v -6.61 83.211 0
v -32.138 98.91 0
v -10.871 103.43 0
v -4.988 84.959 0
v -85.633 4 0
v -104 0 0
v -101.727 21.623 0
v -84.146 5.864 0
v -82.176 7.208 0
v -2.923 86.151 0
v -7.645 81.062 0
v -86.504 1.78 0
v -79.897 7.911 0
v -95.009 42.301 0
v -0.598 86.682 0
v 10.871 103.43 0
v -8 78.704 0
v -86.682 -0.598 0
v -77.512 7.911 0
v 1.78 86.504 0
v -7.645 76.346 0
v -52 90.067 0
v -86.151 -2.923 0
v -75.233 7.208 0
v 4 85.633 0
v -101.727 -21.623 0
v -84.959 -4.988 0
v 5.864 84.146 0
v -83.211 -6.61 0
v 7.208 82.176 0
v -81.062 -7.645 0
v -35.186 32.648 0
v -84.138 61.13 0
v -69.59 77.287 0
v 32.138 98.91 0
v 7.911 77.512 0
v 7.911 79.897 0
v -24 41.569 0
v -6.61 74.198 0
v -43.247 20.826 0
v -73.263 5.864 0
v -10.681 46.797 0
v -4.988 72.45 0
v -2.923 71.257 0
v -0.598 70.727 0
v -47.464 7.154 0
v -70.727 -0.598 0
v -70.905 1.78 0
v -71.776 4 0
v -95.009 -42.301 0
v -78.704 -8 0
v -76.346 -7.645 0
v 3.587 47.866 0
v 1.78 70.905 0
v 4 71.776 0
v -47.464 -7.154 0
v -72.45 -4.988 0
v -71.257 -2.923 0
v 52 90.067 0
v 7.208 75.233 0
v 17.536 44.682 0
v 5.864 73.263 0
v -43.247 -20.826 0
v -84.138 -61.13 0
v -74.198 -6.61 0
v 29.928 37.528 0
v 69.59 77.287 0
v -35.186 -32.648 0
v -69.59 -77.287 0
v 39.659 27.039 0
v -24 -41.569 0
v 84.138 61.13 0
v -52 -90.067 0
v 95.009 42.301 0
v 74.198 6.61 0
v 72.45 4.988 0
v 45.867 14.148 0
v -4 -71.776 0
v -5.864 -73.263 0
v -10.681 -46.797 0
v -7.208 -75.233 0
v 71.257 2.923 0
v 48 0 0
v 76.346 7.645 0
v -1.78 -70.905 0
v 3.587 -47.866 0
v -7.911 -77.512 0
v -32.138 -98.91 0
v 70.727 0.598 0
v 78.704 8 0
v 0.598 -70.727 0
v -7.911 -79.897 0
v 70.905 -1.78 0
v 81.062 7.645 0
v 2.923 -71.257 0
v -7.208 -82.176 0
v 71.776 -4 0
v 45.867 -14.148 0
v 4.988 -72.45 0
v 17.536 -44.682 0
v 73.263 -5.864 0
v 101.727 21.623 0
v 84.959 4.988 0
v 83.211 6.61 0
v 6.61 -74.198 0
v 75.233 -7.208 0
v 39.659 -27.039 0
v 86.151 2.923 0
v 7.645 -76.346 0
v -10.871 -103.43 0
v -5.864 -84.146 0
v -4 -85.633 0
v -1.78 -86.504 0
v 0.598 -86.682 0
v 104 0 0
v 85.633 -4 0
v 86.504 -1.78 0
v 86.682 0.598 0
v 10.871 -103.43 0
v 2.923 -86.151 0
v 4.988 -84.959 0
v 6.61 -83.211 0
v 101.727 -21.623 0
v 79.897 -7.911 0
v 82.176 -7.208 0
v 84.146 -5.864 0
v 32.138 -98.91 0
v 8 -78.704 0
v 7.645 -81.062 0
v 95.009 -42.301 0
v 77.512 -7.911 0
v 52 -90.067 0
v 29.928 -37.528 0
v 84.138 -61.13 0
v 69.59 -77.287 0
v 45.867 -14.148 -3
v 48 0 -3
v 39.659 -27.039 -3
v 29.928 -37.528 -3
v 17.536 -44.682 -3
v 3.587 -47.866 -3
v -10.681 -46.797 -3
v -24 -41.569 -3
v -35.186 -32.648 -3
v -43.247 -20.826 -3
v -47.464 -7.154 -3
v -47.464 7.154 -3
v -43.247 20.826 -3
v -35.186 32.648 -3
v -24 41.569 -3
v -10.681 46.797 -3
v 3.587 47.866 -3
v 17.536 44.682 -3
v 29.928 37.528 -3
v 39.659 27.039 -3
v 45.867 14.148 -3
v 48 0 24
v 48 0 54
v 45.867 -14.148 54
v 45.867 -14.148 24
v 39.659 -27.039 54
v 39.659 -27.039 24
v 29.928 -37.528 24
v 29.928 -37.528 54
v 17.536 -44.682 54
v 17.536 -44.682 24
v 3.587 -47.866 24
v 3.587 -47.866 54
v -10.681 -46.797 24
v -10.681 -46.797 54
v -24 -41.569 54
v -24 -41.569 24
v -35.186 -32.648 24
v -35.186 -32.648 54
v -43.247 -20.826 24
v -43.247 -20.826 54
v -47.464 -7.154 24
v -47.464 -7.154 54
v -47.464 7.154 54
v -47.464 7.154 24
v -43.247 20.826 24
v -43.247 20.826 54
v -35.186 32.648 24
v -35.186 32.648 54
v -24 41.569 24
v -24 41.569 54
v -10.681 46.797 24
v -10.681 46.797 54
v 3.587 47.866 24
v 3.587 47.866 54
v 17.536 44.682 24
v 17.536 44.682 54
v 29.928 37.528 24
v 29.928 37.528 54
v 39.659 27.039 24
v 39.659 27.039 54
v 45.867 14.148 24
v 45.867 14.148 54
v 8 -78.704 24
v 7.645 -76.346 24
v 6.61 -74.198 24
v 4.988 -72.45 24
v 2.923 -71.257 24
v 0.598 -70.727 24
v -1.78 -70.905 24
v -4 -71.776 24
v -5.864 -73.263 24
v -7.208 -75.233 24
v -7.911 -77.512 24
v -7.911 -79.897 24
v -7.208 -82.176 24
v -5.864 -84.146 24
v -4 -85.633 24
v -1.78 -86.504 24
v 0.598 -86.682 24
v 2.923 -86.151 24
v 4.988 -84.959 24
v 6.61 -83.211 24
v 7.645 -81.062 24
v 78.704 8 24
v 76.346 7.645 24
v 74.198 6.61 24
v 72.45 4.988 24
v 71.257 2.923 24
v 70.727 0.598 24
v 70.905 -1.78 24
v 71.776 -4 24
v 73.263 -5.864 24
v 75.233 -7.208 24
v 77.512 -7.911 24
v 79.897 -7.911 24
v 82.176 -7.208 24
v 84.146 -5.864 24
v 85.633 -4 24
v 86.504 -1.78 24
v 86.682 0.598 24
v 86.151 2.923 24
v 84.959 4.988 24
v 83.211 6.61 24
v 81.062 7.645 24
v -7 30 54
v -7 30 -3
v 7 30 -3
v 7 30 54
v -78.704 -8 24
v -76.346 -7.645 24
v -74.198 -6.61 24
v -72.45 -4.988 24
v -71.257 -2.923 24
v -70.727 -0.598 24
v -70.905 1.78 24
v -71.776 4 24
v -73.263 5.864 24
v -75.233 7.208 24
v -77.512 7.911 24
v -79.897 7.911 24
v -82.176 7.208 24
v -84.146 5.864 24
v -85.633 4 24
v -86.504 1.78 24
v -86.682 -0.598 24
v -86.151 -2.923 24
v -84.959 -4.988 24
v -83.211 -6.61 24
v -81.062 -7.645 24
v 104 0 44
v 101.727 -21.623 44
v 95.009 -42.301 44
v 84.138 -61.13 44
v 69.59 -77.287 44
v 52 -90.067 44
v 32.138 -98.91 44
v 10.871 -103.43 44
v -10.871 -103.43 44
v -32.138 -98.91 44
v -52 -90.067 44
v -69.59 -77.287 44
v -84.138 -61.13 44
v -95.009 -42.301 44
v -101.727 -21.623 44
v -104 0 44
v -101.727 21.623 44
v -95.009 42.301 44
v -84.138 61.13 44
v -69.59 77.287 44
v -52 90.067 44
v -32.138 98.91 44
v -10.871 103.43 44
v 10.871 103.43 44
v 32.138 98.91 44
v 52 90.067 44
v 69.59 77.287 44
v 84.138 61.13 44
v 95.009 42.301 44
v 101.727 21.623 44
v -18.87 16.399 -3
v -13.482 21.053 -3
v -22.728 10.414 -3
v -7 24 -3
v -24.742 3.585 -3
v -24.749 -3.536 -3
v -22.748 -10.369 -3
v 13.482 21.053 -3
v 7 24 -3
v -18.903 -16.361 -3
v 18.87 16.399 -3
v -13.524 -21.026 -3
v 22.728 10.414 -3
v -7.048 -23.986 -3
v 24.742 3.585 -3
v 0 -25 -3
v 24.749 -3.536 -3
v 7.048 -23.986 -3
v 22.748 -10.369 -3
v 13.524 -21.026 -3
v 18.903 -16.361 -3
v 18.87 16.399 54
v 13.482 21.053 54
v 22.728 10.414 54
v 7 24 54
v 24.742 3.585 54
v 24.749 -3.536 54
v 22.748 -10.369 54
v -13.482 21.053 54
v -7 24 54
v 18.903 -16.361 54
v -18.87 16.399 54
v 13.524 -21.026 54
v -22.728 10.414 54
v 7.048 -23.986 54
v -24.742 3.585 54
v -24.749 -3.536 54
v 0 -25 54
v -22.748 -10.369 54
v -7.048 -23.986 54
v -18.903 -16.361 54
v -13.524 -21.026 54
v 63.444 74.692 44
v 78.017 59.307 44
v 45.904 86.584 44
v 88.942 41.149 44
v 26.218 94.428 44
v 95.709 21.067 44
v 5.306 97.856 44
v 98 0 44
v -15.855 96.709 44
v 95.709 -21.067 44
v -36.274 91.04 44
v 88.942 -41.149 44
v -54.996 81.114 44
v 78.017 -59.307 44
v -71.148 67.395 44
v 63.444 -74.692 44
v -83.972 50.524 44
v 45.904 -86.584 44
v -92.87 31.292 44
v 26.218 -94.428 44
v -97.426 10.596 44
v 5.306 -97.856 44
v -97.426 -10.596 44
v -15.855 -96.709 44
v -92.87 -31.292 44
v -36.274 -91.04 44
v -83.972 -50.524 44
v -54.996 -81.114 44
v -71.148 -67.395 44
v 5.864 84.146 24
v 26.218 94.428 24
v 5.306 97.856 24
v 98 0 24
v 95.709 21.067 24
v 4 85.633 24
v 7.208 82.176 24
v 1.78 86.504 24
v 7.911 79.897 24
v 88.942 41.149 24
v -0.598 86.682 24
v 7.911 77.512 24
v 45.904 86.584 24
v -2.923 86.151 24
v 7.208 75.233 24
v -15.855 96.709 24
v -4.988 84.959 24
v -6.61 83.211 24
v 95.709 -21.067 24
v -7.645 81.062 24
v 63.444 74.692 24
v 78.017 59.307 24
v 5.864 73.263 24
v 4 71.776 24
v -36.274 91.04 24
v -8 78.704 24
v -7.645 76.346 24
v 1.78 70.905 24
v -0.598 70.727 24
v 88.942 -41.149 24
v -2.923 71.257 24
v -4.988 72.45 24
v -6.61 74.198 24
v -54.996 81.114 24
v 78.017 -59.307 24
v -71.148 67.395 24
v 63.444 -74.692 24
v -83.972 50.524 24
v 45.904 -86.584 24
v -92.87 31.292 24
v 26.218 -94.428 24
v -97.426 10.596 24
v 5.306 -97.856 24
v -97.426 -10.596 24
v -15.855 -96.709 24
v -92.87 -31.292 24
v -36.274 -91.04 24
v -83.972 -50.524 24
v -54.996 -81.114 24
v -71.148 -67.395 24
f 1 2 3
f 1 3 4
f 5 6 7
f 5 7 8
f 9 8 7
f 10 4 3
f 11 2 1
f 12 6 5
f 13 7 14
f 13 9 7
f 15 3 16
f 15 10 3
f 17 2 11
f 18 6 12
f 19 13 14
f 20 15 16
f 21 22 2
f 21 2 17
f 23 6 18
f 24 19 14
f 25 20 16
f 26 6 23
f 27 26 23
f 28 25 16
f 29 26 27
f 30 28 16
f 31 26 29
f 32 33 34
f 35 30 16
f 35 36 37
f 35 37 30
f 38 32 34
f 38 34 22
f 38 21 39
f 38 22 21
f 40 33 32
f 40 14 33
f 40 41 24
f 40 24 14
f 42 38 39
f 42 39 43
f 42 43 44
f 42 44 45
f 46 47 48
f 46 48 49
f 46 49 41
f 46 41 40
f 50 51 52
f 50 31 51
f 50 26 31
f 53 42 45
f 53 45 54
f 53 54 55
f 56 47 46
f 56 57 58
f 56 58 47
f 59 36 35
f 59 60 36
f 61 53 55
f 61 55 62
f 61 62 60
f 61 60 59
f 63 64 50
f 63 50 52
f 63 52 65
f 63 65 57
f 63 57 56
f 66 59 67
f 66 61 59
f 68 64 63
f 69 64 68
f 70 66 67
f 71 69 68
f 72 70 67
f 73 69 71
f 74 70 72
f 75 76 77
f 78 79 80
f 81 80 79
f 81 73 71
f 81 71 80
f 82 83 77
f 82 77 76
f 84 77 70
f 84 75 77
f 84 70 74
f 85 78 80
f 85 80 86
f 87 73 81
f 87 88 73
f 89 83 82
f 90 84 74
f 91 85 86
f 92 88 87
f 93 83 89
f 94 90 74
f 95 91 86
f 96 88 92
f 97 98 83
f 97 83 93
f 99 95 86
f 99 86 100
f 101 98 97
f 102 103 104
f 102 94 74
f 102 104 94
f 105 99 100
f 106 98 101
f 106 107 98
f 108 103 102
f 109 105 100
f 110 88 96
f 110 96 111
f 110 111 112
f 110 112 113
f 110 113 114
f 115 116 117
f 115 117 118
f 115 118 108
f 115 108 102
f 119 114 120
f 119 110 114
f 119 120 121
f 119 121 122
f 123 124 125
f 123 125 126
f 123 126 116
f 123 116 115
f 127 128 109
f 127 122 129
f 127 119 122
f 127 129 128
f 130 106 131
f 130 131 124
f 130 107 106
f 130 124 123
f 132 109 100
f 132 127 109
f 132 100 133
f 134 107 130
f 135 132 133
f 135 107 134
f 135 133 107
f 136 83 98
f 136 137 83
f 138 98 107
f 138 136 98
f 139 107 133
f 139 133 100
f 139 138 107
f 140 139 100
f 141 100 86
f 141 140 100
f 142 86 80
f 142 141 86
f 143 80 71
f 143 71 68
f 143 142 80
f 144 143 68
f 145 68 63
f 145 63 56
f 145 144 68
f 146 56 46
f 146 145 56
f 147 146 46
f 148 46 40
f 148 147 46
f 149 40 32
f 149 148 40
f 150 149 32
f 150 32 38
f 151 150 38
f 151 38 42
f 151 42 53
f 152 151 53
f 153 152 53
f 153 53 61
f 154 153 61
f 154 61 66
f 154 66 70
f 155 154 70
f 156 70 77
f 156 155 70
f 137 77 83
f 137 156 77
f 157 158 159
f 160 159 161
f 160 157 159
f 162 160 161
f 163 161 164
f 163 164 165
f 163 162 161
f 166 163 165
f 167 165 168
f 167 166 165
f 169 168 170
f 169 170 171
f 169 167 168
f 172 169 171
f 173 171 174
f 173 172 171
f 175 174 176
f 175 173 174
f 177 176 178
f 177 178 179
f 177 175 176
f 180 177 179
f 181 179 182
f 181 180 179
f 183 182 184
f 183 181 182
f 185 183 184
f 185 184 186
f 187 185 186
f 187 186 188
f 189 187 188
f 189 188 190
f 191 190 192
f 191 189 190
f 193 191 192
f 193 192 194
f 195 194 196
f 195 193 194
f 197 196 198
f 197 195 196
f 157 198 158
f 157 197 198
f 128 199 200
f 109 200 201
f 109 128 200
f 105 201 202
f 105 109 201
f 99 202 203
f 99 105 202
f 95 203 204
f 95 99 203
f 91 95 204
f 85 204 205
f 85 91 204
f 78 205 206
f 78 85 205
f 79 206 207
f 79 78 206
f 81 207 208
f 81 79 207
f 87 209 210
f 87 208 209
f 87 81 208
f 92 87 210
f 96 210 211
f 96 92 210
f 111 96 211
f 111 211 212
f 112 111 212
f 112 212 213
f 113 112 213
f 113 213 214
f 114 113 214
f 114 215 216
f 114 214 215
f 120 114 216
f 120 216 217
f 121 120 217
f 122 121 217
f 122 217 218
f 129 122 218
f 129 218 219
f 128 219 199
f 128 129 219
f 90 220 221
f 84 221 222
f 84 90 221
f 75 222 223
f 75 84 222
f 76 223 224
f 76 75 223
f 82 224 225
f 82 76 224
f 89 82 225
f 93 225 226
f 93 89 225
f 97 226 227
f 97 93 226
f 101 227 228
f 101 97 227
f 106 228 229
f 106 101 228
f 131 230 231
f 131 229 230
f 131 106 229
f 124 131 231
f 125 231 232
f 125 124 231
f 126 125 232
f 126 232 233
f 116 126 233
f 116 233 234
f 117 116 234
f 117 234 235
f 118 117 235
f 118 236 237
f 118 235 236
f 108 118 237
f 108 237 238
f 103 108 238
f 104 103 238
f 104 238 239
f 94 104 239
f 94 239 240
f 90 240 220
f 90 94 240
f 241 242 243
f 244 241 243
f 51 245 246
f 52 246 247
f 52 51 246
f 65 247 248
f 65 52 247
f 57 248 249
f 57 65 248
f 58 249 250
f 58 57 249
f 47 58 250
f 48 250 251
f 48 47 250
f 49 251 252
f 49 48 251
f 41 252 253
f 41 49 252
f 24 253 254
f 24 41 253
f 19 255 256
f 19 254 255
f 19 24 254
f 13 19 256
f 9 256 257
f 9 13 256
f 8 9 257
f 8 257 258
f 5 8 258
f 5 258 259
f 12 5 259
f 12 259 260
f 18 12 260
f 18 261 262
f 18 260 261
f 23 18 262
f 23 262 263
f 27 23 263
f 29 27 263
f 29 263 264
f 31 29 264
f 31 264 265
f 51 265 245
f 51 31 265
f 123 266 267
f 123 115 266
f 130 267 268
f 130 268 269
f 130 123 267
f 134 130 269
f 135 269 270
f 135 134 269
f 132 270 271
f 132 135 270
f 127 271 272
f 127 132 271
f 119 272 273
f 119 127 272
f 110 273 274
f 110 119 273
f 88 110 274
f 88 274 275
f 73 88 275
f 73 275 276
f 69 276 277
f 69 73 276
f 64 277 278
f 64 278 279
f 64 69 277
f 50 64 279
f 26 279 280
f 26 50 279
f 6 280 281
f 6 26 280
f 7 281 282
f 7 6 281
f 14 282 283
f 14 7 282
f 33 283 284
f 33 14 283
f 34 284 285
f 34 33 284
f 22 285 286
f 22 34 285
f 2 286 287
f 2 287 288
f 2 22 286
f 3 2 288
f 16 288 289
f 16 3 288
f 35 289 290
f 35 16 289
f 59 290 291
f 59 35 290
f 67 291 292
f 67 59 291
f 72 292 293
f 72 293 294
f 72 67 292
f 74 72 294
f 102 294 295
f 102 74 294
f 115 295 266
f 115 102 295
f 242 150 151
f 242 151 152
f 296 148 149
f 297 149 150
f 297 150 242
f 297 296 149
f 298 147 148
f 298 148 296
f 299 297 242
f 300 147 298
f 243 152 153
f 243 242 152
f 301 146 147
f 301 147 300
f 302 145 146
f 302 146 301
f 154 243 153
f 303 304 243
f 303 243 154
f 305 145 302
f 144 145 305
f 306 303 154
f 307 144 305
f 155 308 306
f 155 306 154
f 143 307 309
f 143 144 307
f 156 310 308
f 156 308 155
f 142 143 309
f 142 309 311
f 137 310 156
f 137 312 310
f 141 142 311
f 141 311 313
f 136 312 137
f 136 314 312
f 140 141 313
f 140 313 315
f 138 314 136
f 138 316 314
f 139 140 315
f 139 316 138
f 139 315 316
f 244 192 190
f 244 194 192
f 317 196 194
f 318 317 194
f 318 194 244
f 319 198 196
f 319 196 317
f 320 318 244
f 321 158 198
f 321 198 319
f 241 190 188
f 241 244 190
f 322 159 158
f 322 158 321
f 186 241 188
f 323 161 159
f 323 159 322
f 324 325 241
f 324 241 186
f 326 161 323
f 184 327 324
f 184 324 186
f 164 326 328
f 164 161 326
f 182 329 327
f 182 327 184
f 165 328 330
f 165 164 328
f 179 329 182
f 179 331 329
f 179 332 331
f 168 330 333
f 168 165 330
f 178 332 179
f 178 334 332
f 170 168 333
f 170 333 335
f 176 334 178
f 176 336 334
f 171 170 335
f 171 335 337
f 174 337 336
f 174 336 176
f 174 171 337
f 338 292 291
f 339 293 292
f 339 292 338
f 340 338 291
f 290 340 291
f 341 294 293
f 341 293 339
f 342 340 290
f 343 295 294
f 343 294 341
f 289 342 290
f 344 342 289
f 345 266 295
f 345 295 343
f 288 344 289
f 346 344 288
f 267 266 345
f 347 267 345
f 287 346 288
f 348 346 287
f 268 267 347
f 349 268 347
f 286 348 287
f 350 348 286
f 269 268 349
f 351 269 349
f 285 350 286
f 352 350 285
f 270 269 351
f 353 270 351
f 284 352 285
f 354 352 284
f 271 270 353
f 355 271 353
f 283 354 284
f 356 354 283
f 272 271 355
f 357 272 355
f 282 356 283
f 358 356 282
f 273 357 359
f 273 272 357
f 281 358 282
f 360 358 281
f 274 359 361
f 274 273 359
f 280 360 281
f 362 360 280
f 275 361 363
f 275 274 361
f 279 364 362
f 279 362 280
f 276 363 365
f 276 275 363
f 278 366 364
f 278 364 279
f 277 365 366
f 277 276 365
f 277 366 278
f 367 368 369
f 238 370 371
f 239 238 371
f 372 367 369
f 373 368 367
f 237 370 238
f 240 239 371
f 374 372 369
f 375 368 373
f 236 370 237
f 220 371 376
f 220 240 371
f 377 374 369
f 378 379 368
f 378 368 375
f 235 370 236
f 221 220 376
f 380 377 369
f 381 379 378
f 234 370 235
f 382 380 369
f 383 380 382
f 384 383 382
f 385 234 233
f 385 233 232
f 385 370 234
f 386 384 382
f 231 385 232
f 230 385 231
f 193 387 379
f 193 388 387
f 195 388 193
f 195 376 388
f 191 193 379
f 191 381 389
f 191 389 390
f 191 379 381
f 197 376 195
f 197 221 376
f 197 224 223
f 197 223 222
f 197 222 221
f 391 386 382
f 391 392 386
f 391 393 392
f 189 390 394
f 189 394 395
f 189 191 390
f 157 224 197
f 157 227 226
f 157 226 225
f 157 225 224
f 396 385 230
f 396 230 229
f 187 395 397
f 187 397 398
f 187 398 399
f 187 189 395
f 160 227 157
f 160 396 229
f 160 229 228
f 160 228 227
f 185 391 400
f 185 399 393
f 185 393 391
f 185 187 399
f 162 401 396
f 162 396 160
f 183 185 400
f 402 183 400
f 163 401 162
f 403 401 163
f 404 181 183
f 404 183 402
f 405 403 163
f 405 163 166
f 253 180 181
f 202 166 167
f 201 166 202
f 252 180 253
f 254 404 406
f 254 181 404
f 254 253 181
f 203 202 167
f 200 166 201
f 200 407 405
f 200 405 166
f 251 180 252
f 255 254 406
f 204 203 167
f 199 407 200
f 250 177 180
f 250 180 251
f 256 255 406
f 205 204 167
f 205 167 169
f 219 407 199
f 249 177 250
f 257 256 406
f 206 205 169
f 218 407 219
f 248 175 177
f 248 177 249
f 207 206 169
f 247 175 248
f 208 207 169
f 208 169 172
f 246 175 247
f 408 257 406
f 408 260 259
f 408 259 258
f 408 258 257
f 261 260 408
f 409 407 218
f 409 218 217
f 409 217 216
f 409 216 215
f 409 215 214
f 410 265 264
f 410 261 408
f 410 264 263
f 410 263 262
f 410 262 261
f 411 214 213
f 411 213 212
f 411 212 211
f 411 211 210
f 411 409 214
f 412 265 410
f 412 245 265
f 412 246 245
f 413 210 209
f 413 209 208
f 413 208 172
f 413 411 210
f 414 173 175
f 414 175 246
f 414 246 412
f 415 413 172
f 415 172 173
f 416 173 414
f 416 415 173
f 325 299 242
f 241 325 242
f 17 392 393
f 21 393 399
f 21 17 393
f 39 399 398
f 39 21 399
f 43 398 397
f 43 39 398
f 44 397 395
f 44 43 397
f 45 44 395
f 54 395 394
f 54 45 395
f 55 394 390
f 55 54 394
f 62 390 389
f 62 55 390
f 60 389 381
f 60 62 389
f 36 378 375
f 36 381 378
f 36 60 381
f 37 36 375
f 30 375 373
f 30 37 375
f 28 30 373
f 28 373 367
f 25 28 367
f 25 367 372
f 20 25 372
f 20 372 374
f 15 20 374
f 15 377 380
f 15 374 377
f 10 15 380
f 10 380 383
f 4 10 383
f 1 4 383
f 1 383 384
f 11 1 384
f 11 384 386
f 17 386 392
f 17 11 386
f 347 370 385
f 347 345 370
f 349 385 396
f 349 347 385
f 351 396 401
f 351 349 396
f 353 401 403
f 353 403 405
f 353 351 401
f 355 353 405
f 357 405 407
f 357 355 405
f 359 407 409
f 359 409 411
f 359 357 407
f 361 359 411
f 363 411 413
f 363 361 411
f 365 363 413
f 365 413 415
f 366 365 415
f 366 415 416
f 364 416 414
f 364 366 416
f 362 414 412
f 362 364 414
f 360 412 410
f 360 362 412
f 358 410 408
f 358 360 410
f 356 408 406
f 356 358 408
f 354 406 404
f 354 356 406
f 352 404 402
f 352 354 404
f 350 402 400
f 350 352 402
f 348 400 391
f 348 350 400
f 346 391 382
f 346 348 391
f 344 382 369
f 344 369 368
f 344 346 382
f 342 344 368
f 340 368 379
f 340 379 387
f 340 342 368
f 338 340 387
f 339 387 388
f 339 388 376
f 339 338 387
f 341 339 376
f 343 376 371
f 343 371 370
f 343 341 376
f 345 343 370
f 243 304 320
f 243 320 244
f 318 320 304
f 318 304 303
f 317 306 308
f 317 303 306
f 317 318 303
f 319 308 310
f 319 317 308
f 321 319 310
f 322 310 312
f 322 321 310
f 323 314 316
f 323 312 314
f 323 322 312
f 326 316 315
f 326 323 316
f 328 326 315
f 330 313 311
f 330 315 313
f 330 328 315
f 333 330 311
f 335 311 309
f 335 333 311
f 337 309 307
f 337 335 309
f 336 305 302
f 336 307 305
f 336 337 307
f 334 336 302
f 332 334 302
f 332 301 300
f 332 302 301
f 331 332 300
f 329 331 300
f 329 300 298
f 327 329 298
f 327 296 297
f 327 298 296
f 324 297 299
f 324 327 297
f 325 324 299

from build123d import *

# Parameters (mm, degrees)
SKETCH2_W          = 14
SKETCH2_H          = 10
CUT_EXTRUDE1_DEPTH = 73
SKETCH3_R          = 8
CUT_EXTRUDE2_DEPTH = 217
CIRPATTERN1_COUNT  = 4


with BuildPart() as part:
    # Sketch1 → Revolve1 (revolve)
    with BuildSketch(Plane(origin=(0, 0, 0), x_dir=(0, 0, -1), z_dir=(1, 0, 0)), mode=Mode.PRIVATE) as revolve1_sk:
        Polygon((-44, 104), (0, 104), (0, 48), (3, 48), (3, 25), (-54, 25), (-54, 48), (-24, 48), (-24, 98), (-44, 98), align=None)
    revolve(revolve1_sk.sketch.rotate(Axis((0, 0, 52.496471852), (0, 0, -1)), 90), axis=Axis((0, 0, 52.496471852), (0, 0, -1)))

    # Sketch2 → Cut-Extrude1 (cut, symmetric)
    with BuildSketch(Plane.XY):
        with Locations((0, 25)):
            Rectangle(SKETCH2_W, SKETCH2_H)
    extrude(amount=CUT_EXTRUDE1_DEPTH, both=True, mode=Mode.SUBTRACT)

    # Sketch3 → Cut-Extrude2 (cut)
    with BuildSketch(Plane.XY):
        with Locations(Location((0, 78.704447468, 0), (0, 0, 180))):
            Circle(SKETCH3_R)
    cut_extrude2 = extrude(amount=CUT_EXTRUDE2_DEPTH, mode=Mode.SUBTRACT)

    # CirPattern1: Cut-Extrude2 ×4 about axis
    cirpattern1_axis = Axis((0, 0, 0), (0, 0, 1))
    for i in range(1, CIRPATTERN1_COUNT):
        add(cut_extrude2.rotate(cirpattern1_axis, i * 360 / CIRPATTERN1_COUNT), mode=Mode.SUBTRACT)


solid = part.part
